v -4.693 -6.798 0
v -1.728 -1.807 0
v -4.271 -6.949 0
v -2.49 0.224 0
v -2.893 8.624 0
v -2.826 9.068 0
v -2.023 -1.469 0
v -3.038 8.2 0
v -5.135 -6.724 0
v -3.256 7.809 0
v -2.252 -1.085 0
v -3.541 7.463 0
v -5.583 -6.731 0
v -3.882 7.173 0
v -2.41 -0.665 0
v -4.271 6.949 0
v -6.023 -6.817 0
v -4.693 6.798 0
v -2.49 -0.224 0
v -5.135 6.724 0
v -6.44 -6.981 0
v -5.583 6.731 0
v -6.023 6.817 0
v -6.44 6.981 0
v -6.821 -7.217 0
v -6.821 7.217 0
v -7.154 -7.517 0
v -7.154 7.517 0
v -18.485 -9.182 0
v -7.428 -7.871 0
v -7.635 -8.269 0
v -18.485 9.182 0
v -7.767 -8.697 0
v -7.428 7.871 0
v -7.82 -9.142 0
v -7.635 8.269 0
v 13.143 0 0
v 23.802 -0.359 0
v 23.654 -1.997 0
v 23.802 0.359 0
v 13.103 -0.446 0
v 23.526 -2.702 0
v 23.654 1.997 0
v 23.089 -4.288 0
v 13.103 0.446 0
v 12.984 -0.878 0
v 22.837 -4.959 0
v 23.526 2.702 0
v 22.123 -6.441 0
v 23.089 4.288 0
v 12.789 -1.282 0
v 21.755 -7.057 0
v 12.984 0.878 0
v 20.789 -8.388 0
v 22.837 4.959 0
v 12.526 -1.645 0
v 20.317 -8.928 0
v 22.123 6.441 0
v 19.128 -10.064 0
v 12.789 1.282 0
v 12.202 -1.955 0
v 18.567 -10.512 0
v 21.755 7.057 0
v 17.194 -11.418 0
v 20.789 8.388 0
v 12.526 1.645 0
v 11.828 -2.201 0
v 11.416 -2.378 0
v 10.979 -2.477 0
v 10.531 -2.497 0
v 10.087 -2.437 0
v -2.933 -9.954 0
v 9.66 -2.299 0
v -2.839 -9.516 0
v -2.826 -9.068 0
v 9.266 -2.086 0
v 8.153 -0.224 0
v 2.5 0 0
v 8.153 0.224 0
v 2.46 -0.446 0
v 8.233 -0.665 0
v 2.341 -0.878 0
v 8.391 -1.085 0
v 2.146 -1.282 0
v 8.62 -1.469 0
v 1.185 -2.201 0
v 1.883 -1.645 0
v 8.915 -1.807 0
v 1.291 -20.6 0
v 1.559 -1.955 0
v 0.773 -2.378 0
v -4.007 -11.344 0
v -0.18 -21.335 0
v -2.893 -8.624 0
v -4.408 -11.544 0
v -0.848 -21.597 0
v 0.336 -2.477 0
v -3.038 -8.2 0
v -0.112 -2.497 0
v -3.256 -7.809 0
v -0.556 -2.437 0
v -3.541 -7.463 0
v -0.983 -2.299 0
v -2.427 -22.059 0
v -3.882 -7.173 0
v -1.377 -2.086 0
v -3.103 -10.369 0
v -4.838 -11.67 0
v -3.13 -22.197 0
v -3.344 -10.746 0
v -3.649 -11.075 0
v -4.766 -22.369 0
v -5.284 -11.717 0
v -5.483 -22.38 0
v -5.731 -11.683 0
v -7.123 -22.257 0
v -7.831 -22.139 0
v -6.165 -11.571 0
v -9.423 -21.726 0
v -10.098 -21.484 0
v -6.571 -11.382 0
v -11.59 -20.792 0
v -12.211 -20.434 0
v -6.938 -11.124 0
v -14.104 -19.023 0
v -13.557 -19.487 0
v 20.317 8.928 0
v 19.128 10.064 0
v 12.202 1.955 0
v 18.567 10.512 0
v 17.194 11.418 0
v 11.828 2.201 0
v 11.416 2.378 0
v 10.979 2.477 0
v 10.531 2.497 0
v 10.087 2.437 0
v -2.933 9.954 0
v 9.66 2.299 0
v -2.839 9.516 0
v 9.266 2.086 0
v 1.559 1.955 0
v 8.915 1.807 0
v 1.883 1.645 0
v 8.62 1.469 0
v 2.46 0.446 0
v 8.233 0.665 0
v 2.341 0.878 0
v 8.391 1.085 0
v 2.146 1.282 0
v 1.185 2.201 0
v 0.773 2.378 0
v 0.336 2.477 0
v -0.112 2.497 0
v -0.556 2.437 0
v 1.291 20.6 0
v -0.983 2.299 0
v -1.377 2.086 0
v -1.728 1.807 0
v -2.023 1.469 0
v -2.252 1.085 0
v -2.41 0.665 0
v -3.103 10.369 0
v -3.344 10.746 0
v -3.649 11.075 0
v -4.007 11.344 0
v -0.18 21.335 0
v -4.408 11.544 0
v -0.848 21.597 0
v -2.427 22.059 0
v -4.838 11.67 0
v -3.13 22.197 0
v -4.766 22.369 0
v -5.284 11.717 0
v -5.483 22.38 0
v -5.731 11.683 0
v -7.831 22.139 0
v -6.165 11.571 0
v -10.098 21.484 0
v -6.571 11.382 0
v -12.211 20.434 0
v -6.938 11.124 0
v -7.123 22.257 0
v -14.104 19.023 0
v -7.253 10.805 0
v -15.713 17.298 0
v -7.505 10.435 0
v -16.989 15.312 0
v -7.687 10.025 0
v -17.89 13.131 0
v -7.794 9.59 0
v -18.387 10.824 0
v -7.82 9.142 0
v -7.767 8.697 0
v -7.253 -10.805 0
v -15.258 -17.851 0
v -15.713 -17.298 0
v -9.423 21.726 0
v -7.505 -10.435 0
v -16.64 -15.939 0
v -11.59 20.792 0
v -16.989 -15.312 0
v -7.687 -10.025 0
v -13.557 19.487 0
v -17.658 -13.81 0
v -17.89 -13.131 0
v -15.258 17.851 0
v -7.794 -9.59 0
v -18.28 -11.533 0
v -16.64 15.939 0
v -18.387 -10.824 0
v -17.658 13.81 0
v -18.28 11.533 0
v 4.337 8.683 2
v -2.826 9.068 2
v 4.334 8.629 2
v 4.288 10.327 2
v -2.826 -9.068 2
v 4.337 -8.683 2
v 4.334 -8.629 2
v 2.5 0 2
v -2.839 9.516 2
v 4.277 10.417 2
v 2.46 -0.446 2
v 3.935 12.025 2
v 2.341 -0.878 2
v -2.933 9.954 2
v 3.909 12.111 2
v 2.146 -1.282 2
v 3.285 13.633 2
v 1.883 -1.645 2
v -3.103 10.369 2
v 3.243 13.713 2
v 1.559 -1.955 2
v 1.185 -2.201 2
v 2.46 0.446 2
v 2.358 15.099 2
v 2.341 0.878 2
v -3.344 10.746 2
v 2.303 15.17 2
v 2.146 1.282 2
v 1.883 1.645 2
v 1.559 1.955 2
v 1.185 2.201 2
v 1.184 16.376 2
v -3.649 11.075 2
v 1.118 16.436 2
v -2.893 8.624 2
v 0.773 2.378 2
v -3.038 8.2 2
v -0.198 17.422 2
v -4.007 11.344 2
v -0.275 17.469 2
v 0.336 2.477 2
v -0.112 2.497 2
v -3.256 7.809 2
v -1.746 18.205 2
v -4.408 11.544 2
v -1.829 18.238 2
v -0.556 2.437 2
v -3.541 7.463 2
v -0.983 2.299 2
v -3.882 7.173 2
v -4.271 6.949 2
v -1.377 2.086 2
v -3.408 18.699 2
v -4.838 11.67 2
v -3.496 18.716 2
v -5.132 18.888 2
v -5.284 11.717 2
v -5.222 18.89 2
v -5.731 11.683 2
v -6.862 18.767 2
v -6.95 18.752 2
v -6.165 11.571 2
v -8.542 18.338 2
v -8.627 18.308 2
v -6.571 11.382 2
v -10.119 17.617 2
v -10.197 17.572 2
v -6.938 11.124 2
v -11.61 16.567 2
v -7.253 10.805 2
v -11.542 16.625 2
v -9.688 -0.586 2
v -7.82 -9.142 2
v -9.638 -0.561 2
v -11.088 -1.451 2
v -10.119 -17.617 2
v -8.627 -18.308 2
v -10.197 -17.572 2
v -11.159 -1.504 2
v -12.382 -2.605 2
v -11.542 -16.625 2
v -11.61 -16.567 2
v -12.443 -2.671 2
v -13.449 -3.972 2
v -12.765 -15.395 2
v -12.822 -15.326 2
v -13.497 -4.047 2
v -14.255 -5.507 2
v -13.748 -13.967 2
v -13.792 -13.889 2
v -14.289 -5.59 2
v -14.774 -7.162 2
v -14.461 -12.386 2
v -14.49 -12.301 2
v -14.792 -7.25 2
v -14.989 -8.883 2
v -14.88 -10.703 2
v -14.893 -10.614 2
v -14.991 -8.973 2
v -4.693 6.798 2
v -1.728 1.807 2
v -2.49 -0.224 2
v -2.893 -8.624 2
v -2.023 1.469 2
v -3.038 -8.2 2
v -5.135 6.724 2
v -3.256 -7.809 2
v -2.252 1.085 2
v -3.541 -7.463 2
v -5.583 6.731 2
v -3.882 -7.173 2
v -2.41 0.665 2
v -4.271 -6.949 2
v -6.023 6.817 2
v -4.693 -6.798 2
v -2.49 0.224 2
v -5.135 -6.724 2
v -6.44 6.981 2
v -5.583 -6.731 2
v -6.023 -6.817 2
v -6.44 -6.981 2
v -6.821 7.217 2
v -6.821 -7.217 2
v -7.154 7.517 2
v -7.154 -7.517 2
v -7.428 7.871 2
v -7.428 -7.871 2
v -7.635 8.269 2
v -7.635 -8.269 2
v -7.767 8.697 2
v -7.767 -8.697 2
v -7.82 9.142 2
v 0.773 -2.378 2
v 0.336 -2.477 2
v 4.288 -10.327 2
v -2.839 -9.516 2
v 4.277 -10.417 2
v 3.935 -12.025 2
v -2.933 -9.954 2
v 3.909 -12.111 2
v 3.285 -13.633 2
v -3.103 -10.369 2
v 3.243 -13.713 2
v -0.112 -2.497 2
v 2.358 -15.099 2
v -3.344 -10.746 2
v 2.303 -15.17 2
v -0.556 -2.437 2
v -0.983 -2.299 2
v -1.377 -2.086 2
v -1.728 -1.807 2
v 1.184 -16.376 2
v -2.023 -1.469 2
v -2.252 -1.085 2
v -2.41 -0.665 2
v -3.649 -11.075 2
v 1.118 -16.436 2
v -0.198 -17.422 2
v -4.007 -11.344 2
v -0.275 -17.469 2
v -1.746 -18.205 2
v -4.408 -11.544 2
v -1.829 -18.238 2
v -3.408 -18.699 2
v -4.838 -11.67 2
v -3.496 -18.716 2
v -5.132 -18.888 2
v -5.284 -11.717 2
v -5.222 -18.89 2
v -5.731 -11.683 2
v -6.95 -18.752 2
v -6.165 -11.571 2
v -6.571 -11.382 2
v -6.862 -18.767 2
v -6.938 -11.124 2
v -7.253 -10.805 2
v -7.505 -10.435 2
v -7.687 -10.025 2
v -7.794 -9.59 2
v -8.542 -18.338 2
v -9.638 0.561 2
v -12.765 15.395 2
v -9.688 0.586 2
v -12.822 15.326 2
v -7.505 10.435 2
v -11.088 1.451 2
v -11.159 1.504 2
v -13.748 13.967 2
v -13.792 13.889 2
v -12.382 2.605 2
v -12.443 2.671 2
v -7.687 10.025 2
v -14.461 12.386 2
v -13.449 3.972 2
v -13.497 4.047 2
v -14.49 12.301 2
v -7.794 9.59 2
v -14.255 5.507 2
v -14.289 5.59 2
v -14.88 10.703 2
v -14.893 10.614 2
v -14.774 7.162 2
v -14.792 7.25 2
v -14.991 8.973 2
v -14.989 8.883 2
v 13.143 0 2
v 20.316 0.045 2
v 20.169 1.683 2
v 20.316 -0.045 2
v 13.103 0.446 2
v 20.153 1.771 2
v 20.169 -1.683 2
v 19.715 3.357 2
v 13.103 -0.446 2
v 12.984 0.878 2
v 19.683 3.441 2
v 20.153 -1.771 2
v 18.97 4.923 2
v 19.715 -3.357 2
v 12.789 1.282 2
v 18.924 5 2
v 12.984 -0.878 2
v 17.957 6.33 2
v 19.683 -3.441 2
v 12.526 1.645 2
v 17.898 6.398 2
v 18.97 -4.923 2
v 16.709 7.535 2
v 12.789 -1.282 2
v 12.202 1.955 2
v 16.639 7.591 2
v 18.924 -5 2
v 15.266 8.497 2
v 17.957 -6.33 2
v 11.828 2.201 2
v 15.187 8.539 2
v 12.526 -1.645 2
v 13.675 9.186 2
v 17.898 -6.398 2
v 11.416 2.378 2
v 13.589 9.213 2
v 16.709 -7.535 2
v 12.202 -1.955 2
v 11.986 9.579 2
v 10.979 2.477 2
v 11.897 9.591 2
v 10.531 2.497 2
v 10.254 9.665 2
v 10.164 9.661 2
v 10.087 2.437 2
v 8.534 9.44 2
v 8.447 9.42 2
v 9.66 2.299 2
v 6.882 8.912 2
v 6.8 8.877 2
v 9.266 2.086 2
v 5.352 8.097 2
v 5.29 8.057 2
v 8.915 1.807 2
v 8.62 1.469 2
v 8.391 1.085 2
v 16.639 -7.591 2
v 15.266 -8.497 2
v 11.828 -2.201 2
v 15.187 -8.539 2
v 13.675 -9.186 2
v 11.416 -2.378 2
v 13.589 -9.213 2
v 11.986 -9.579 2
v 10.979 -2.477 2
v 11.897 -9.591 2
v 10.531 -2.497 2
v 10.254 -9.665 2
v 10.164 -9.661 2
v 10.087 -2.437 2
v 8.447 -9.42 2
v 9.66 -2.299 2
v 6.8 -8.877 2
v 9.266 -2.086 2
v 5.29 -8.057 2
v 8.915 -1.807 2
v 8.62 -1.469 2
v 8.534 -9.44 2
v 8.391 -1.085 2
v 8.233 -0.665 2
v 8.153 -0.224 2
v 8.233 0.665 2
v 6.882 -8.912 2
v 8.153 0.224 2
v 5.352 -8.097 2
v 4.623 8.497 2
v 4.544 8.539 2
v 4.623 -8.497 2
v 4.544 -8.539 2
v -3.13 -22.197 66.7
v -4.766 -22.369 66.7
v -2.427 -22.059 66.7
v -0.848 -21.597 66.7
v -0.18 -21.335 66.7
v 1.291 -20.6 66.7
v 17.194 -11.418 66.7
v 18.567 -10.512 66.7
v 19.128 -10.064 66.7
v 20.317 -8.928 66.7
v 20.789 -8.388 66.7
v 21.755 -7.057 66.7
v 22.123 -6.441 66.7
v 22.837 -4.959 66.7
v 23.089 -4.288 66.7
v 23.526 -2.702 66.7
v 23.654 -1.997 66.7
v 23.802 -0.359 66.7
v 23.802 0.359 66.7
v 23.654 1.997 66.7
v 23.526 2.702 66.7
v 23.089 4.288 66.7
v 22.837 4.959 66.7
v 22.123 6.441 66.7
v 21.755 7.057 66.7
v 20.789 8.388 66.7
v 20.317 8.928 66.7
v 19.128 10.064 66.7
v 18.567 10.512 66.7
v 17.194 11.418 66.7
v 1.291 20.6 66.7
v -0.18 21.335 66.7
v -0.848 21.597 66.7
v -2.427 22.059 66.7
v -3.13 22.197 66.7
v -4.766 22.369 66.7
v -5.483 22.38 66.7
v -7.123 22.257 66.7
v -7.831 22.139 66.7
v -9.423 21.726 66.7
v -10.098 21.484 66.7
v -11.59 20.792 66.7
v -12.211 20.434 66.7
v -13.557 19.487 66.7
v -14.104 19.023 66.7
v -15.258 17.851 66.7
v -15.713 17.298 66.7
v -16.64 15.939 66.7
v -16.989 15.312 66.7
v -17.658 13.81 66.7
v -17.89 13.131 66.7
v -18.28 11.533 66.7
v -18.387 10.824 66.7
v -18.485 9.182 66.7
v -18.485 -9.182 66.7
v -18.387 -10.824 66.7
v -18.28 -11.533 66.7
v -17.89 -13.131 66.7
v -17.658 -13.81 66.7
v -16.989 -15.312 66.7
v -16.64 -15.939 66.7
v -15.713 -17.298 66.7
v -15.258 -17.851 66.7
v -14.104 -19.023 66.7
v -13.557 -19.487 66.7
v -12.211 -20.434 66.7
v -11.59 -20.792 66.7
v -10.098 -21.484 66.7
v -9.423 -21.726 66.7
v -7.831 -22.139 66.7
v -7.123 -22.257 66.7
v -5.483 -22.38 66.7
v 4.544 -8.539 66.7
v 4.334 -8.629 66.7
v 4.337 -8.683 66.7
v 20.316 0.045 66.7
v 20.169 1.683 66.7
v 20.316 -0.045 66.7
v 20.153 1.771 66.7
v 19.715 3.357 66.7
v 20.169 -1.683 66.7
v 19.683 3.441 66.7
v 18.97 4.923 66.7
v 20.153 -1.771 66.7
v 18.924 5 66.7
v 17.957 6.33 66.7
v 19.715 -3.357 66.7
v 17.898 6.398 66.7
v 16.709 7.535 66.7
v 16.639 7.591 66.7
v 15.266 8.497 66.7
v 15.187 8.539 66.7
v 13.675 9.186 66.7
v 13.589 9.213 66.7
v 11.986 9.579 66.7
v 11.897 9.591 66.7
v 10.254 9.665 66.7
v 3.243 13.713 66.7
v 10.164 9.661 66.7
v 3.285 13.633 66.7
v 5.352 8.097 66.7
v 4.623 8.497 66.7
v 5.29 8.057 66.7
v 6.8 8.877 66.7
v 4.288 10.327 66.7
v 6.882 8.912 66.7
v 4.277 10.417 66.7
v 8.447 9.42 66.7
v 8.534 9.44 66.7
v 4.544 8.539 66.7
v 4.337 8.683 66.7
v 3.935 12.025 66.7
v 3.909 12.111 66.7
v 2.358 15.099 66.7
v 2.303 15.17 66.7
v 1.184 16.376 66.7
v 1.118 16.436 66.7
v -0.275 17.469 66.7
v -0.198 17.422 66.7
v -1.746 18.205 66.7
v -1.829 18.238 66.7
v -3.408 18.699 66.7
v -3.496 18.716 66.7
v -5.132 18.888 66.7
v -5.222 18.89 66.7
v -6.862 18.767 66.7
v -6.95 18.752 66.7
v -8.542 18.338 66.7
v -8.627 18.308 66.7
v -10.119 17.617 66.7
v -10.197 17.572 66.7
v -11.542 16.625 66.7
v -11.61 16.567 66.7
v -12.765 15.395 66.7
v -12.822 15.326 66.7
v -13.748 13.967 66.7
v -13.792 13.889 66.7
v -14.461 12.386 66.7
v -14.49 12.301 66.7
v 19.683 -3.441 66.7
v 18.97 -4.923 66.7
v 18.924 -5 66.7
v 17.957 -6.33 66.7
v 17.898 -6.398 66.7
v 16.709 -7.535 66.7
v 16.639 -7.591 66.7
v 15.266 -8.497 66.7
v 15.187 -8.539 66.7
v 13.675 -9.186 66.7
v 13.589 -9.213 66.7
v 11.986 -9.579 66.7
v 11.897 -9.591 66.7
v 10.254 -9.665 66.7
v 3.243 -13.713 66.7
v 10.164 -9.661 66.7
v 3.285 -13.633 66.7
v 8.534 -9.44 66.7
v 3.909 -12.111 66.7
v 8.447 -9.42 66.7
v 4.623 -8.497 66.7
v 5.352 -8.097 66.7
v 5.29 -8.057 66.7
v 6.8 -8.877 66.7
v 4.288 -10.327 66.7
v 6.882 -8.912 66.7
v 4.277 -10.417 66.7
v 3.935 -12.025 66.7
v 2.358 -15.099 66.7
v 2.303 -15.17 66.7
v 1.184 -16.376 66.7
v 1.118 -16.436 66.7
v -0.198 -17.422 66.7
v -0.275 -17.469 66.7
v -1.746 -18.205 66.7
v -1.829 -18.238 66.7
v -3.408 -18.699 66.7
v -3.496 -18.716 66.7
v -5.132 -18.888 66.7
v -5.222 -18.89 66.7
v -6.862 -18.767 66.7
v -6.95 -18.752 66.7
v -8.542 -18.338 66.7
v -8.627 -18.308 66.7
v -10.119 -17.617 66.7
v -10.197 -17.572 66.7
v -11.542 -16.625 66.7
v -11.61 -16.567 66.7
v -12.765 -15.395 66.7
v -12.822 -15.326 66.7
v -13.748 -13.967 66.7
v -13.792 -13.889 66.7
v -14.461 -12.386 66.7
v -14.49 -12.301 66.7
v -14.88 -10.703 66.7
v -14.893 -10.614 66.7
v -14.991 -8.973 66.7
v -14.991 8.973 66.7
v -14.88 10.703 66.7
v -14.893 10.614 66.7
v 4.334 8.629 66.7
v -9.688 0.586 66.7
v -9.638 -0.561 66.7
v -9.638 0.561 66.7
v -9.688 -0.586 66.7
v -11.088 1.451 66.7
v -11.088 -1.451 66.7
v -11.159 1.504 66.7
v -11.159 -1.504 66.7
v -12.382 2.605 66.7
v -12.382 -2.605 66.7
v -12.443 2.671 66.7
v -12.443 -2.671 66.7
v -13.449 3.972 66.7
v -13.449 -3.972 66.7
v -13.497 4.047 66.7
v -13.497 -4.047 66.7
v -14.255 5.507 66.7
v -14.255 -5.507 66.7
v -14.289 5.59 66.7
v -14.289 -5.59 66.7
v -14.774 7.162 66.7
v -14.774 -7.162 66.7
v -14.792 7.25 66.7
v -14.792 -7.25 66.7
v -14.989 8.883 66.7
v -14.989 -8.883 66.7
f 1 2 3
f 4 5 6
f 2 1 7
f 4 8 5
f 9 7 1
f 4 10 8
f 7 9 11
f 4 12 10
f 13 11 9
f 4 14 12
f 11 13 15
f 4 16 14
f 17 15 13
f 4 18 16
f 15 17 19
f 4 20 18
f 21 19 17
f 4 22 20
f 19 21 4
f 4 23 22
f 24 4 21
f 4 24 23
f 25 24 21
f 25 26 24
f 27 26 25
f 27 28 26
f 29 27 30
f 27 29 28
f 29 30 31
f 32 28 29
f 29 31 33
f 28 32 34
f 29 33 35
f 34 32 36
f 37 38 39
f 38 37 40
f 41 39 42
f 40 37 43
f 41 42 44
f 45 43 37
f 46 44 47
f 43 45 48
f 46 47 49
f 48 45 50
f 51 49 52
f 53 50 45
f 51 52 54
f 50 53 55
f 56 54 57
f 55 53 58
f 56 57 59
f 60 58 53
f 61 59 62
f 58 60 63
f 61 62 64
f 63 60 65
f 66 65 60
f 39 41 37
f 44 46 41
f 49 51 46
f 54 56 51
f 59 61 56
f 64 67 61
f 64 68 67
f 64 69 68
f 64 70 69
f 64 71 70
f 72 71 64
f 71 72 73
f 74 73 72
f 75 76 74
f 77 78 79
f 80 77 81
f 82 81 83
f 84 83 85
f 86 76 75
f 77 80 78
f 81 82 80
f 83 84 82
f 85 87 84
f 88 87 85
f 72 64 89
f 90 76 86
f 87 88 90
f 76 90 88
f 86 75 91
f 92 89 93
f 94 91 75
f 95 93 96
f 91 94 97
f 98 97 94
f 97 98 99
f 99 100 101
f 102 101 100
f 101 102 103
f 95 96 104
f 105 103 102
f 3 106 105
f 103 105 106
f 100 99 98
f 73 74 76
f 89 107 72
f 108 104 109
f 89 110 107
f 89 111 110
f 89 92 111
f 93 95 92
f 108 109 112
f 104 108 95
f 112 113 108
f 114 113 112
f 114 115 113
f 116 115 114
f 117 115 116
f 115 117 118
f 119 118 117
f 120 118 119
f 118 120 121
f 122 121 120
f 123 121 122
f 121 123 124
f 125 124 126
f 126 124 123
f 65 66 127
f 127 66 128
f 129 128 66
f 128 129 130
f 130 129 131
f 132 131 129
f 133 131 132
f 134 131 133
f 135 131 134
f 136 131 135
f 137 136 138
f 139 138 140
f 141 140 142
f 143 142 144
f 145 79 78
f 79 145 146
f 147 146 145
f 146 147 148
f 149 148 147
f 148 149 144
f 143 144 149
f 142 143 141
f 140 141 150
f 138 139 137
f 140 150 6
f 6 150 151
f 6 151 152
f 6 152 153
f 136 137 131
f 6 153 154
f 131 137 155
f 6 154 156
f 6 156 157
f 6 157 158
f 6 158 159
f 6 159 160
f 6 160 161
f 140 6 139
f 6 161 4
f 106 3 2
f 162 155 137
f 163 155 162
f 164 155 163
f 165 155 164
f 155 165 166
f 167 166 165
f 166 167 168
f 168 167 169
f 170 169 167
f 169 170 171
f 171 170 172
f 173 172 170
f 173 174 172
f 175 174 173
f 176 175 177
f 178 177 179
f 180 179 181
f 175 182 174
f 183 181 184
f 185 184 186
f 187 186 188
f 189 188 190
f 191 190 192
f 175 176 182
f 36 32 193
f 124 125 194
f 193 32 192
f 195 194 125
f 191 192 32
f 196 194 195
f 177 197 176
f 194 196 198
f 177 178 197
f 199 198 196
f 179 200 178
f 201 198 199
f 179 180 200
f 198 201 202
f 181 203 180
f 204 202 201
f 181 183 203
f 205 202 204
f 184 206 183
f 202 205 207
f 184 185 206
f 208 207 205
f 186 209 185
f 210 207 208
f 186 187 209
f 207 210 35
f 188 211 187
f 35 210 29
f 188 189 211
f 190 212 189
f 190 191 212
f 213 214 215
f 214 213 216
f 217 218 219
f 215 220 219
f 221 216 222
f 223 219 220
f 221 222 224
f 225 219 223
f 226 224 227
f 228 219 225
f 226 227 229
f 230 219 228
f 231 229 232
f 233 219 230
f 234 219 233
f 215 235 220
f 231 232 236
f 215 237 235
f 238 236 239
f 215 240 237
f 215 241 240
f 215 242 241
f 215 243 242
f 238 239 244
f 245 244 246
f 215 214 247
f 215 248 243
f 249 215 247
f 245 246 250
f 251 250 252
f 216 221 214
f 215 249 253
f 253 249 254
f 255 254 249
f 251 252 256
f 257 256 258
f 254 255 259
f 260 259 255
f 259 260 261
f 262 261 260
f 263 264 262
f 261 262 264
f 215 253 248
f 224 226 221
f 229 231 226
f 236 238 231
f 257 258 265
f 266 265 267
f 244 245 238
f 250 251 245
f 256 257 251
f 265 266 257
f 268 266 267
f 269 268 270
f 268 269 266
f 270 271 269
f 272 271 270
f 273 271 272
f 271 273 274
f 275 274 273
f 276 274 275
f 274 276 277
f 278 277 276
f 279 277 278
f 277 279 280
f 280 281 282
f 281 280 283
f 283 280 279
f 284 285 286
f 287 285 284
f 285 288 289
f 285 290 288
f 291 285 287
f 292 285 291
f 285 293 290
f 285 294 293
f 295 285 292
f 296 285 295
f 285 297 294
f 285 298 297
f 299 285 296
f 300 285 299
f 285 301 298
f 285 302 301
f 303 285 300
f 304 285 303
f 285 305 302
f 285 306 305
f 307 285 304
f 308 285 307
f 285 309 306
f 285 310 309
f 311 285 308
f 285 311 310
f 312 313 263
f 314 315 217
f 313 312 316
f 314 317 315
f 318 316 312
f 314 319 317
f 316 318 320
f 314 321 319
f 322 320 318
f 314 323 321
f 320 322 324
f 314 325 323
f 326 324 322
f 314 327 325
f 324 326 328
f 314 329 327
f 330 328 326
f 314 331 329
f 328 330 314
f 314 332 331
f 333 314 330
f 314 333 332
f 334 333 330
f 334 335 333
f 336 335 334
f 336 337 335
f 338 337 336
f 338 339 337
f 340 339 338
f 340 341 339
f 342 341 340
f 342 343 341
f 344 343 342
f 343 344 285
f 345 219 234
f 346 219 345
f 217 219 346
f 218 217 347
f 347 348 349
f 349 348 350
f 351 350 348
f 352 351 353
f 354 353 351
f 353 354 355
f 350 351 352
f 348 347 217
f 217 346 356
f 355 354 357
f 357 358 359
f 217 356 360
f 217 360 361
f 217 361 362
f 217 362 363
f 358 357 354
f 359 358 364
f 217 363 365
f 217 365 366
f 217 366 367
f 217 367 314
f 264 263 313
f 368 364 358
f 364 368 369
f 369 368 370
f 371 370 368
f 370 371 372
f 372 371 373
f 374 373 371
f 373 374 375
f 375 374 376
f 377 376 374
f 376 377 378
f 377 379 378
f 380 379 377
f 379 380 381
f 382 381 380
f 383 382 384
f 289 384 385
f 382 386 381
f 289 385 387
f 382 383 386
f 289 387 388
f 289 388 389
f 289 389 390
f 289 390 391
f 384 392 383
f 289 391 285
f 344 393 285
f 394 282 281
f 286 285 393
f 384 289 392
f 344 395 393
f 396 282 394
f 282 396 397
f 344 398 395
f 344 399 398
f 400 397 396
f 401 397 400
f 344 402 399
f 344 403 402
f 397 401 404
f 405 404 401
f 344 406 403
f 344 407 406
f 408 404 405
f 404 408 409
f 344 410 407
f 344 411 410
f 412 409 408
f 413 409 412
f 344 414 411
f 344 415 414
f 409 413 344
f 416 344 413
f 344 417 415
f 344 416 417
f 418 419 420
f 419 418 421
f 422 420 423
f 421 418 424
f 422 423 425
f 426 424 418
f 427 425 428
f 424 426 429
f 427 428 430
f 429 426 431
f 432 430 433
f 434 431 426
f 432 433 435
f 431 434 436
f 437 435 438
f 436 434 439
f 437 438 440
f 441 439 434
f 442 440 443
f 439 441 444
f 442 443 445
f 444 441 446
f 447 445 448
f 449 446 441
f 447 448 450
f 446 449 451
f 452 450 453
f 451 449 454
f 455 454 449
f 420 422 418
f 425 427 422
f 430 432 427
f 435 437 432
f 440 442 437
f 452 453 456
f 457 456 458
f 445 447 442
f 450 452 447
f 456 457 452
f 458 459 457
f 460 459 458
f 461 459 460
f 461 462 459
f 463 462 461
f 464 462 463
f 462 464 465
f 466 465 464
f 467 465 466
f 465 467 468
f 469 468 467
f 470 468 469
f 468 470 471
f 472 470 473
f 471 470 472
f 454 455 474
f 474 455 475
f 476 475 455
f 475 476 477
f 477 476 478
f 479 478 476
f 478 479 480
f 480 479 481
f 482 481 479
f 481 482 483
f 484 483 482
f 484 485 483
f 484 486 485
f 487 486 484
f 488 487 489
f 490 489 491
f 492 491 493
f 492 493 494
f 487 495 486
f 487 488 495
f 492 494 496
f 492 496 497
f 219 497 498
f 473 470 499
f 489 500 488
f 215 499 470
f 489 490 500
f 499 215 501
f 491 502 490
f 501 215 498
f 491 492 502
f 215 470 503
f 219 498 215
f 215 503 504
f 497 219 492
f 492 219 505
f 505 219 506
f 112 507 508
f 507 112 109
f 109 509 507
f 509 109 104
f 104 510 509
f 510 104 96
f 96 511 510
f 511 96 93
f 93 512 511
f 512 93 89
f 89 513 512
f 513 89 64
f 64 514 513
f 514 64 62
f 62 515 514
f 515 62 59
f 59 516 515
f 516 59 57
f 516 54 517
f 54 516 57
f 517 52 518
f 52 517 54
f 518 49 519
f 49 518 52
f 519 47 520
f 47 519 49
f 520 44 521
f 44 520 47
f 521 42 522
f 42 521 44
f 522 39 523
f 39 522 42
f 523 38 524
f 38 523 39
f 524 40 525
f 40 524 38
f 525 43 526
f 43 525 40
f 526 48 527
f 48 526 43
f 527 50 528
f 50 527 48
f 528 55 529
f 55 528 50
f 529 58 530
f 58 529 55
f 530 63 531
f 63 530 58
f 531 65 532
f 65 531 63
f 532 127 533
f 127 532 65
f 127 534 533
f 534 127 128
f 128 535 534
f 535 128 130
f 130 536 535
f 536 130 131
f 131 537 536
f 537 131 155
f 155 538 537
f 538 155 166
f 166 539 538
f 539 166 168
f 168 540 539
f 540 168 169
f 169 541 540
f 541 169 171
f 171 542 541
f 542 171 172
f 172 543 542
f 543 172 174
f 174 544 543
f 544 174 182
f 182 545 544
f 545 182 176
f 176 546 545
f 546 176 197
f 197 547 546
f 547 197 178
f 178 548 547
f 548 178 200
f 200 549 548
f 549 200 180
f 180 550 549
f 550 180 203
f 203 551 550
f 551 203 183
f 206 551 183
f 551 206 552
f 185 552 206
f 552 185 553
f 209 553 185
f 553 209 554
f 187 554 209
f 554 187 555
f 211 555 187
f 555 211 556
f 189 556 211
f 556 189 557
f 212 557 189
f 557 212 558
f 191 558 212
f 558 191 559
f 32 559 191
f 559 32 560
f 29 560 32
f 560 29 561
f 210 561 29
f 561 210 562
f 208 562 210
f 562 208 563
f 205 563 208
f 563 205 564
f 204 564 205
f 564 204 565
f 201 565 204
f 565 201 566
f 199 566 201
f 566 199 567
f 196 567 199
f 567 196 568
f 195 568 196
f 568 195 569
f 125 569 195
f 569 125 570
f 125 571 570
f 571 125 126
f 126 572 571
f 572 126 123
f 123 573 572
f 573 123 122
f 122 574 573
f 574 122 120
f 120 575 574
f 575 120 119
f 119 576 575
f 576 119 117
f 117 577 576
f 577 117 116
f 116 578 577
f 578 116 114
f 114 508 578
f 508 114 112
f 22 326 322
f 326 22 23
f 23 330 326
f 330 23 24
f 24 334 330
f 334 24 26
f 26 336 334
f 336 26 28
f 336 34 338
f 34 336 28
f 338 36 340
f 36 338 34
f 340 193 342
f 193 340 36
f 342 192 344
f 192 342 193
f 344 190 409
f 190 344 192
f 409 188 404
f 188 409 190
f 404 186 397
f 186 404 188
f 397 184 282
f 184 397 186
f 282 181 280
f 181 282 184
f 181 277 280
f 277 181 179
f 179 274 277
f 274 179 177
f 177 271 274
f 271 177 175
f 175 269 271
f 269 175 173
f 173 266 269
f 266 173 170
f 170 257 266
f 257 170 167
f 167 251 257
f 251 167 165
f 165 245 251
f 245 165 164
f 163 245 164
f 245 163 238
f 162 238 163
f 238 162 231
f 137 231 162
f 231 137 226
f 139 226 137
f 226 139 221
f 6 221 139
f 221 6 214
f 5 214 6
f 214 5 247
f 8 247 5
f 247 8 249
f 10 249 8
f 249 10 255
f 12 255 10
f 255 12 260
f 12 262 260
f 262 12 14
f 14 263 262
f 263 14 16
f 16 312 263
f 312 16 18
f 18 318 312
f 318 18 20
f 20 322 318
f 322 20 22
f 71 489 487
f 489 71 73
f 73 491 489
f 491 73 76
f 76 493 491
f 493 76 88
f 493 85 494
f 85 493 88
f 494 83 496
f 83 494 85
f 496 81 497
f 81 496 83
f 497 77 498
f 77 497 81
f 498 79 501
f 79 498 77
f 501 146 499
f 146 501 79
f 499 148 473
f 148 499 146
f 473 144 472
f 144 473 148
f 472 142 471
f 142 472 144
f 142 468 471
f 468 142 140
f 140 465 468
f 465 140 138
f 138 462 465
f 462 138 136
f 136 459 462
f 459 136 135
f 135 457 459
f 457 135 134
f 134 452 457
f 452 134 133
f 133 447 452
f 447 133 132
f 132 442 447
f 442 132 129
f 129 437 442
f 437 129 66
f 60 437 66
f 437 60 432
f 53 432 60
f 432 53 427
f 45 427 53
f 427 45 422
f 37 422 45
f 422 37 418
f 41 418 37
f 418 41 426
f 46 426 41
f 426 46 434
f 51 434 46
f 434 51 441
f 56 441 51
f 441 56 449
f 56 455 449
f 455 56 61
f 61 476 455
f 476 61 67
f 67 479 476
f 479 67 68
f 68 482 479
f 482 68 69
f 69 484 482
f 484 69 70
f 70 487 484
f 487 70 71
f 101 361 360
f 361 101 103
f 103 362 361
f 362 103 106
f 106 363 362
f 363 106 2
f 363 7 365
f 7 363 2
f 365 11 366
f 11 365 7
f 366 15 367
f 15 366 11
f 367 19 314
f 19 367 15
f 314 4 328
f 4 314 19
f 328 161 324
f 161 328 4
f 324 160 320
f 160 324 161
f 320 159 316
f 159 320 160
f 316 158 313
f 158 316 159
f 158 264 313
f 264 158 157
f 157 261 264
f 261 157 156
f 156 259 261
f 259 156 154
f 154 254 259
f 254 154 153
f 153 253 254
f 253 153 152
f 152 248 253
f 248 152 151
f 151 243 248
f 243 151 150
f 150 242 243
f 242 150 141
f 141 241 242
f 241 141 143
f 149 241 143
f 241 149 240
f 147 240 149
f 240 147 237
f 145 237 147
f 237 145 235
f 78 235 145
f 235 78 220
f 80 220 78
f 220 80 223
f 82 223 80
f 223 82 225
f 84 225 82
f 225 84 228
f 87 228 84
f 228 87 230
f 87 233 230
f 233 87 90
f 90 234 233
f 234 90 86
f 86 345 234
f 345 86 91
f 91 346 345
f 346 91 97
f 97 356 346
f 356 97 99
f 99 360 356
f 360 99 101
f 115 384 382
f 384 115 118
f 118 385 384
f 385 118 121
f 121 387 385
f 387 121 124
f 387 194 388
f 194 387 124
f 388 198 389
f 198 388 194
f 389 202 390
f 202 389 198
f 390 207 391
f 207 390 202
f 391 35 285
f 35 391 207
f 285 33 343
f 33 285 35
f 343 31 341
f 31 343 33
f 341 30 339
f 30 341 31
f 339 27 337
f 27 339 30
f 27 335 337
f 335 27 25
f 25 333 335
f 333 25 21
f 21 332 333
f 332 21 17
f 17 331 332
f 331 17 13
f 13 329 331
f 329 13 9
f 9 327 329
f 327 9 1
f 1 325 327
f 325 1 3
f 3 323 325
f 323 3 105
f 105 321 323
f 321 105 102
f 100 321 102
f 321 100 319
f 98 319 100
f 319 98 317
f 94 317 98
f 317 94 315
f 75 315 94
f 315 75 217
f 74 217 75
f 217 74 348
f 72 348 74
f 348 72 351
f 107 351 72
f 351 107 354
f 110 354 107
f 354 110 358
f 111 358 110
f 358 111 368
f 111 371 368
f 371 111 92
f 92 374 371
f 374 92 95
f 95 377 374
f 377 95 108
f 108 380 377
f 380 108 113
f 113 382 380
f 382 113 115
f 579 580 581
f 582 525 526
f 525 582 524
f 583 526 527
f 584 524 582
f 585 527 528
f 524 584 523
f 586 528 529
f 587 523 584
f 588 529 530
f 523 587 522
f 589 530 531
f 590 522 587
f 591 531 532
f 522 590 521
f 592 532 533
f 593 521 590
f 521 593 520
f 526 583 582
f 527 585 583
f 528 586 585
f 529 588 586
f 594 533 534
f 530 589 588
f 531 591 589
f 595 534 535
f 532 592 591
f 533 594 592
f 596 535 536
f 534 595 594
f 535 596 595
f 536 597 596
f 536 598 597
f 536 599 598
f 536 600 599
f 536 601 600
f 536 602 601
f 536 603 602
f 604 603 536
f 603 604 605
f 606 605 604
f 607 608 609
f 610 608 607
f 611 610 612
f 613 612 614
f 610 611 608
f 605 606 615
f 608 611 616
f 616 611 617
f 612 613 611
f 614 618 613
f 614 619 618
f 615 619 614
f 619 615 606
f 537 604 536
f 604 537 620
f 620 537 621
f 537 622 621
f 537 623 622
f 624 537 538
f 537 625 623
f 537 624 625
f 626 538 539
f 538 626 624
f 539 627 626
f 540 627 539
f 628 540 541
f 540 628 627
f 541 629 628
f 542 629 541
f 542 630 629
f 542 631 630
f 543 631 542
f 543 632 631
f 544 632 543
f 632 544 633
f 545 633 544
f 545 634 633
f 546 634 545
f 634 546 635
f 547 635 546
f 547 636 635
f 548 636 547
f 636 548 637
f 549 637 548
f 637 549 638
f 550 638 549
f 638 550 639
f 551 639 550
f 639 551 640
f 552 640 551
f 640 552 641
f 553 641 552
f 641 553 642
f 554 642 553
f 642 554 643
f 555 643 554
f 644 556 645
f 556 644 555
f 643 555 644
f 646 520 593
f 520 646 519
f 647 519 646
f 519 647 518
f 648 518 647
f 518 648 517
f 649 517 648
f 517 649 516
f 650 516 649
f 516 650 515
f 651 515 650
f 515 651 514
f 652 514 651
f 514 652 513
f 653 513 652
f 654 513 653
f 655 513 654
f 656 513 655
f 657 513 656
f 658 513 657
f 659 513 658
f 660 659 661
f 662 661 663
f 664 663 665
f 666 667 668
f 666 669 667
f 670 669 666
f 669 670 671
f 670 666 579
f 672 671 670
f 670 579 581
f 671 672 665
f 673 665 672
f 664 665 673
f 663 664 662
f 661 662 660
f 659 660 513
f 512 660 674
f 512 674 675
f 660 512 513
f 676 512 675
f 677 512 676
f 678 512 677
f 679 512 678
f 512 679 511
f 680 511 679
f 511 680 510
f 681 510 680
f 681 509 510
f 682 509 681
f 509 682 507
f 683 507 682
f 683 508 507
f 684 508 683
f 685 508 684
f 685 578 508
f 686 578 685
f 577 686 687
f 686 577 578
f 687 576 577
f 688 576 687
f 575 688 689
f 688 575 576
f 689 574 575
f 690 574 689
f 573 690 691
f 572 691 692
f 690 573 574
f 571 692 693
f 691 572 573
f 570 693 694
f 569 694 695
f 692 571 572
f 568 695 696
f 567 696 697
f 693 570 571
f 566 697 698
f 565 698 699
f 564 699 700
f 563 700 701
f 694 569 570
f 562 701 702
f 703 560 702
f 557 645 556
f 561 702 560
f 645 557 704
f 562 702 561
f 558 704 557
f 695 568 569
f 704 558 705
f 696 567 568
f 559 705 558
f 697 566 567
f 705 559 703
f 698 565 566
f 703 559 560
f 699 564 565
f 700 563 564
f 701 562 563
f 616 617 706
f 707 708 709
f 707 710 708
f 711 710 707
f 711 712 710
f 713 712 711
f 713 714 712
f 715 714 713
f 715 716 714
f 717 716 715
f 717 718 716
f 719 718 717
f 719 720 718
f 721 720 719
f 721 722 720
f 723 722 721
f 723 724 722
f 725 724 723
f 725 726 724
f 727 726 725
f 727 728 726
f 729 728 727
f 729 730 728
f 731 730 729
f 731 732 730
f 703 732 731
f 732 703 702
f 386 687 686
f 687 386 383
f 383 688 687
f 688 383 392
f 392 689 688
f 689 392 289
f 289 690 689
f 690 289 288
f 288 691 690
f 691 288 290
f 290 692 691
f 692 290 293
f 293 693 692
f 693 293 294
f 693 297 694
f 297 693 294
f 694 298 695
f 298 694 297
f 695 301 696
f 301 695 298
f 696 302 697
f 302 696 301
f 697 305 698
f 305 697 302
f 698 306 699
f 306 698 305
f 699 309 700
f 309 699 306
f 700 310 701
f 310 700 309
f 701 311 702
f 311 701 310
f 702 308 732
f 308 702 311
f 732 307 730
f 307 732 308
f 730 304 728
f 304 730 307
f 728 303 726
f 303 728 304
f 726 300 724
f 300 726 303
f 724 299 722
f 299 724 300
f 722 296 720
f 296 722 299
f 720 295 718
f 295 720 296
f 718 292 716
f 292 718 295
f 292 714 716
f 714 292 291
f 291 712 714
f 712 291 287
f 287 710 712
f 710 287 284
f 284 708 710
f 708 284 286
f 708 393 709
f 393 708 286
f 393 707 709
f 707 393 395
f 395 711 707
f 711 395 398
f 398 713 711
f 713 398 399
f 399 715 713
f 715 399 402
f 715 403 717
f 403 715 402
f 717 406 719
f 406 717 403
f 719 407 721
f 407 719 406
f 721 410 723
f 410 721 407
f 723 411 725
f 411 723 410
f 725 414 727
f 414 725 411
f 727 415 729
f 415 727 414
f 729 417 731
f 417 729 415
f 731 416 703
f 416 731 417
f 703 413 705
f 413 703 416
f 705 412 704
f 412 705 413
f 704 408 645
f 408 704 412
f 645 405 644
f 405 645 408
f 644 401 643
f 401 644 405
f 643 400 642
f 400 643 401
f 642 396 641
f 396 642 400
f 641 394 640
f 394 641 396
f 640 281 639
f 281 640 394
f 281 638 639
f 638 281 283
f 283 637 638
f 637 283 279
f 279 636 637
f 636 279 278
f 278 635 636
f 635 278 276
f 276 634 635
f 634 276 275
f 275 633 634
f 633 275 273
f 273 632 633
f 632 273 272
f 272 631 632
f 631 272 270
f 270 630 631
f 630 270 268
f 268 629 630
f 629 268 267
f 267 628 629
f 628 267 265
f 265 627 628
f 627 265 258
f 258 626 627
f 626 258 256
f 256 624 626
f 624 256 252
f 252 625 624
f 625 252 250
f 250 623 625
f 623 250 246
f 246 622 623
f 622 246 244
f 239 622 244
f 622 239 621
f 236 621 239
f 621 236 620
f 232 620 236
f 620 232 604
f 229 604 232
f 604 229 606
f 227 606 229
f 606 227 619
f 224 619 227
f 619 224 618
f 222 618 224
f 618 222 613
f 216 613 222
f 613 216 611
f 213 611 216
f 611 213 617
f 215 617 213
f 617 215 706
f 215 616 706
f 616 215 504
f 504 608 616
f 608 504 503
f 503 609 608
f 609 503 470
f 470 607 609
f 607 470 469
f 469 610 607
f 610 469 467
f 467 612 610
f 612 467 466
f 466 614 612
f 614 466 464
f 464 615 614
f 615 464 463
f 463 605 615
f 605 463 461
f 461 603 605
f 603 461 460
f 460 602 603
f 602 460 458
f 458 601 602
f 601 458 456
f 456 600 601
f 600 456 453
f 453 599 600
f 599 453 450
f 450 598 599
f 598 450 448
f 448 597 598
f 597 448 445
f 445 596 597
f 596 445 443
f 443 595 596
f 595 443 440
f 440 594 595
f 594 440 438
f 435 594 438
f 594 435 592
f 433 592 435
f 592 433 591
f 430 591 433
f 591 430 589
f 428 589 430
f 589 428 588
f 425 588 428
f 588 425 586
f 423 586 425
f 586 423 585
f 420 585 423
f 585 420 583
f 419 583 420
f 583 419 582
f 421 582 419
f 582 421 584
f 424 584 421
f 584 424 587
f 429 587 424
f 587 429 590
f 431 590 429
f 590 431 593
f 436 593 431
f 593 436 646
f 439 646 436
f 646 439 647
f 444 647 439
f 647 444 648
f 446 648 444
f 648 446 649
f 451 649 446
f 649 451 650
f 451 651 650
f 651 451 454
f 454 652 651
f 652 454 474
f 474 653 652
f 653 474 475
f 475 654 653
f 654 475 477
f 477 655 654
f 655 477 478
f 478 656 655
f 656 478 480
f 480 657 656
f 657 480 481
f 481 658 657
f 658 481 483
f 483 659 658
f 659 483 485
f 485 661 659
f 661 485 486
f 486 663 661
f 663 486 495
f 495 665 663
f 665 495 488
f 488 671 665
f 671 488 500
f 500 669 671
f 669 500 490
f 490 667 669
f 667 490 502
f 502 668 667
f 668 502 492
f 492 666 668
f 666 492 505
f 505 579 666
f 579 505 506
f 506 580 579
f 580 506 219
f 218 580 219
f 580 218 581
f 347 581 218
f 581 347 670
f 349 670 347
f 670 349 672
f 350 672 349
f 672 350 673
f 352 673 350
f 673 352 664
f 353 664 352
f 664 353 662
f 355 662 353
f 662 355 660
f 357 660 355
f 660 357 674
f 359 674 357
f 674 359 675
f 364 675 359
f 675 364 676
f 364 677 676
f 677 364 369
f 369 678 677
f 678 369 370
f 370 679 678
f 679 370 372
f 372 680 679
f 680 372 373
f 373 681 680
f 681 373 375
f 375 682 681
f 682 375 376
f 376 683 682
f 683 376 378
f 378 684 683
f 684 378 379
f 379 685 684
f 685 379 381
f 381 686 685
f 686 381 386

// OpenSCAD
module 2dTri18650(diameter=18.35, distance=(18.35/2)*1.16) {
  radius = (diameter/2);
  
  for (i = [0:2])
  rotate(360/3*i)
  translate([distance,0])
  circle(r=radius, $fn=35);
  
  // Central cutout
  circle(r=radius, $fn=35);
}

module Tri18650(length=64.7, floorHeight=2, clearance=0.5, wall=4) {
  union() {
    
    linear_extrude(height=floorHeight)
    difference() {
      hull()
      offset(r=wall)
      2dTri18650();
      
      2dTri18650(diameter=5);
    }
    
    translate([0,0,floorHeight])
    linear_extrude(height=length)
    difference() {
      hull()
      offset(r=wall)
      2dTri18650();
      
      offset(r=clearance)
      2dTri18650();
    }
  }
}

*for (i=[0:2])
rotate(60+(120*i))
translate([(8+(18.35*0.58))*2,0,0])
Tri18650();

Tri18650();
